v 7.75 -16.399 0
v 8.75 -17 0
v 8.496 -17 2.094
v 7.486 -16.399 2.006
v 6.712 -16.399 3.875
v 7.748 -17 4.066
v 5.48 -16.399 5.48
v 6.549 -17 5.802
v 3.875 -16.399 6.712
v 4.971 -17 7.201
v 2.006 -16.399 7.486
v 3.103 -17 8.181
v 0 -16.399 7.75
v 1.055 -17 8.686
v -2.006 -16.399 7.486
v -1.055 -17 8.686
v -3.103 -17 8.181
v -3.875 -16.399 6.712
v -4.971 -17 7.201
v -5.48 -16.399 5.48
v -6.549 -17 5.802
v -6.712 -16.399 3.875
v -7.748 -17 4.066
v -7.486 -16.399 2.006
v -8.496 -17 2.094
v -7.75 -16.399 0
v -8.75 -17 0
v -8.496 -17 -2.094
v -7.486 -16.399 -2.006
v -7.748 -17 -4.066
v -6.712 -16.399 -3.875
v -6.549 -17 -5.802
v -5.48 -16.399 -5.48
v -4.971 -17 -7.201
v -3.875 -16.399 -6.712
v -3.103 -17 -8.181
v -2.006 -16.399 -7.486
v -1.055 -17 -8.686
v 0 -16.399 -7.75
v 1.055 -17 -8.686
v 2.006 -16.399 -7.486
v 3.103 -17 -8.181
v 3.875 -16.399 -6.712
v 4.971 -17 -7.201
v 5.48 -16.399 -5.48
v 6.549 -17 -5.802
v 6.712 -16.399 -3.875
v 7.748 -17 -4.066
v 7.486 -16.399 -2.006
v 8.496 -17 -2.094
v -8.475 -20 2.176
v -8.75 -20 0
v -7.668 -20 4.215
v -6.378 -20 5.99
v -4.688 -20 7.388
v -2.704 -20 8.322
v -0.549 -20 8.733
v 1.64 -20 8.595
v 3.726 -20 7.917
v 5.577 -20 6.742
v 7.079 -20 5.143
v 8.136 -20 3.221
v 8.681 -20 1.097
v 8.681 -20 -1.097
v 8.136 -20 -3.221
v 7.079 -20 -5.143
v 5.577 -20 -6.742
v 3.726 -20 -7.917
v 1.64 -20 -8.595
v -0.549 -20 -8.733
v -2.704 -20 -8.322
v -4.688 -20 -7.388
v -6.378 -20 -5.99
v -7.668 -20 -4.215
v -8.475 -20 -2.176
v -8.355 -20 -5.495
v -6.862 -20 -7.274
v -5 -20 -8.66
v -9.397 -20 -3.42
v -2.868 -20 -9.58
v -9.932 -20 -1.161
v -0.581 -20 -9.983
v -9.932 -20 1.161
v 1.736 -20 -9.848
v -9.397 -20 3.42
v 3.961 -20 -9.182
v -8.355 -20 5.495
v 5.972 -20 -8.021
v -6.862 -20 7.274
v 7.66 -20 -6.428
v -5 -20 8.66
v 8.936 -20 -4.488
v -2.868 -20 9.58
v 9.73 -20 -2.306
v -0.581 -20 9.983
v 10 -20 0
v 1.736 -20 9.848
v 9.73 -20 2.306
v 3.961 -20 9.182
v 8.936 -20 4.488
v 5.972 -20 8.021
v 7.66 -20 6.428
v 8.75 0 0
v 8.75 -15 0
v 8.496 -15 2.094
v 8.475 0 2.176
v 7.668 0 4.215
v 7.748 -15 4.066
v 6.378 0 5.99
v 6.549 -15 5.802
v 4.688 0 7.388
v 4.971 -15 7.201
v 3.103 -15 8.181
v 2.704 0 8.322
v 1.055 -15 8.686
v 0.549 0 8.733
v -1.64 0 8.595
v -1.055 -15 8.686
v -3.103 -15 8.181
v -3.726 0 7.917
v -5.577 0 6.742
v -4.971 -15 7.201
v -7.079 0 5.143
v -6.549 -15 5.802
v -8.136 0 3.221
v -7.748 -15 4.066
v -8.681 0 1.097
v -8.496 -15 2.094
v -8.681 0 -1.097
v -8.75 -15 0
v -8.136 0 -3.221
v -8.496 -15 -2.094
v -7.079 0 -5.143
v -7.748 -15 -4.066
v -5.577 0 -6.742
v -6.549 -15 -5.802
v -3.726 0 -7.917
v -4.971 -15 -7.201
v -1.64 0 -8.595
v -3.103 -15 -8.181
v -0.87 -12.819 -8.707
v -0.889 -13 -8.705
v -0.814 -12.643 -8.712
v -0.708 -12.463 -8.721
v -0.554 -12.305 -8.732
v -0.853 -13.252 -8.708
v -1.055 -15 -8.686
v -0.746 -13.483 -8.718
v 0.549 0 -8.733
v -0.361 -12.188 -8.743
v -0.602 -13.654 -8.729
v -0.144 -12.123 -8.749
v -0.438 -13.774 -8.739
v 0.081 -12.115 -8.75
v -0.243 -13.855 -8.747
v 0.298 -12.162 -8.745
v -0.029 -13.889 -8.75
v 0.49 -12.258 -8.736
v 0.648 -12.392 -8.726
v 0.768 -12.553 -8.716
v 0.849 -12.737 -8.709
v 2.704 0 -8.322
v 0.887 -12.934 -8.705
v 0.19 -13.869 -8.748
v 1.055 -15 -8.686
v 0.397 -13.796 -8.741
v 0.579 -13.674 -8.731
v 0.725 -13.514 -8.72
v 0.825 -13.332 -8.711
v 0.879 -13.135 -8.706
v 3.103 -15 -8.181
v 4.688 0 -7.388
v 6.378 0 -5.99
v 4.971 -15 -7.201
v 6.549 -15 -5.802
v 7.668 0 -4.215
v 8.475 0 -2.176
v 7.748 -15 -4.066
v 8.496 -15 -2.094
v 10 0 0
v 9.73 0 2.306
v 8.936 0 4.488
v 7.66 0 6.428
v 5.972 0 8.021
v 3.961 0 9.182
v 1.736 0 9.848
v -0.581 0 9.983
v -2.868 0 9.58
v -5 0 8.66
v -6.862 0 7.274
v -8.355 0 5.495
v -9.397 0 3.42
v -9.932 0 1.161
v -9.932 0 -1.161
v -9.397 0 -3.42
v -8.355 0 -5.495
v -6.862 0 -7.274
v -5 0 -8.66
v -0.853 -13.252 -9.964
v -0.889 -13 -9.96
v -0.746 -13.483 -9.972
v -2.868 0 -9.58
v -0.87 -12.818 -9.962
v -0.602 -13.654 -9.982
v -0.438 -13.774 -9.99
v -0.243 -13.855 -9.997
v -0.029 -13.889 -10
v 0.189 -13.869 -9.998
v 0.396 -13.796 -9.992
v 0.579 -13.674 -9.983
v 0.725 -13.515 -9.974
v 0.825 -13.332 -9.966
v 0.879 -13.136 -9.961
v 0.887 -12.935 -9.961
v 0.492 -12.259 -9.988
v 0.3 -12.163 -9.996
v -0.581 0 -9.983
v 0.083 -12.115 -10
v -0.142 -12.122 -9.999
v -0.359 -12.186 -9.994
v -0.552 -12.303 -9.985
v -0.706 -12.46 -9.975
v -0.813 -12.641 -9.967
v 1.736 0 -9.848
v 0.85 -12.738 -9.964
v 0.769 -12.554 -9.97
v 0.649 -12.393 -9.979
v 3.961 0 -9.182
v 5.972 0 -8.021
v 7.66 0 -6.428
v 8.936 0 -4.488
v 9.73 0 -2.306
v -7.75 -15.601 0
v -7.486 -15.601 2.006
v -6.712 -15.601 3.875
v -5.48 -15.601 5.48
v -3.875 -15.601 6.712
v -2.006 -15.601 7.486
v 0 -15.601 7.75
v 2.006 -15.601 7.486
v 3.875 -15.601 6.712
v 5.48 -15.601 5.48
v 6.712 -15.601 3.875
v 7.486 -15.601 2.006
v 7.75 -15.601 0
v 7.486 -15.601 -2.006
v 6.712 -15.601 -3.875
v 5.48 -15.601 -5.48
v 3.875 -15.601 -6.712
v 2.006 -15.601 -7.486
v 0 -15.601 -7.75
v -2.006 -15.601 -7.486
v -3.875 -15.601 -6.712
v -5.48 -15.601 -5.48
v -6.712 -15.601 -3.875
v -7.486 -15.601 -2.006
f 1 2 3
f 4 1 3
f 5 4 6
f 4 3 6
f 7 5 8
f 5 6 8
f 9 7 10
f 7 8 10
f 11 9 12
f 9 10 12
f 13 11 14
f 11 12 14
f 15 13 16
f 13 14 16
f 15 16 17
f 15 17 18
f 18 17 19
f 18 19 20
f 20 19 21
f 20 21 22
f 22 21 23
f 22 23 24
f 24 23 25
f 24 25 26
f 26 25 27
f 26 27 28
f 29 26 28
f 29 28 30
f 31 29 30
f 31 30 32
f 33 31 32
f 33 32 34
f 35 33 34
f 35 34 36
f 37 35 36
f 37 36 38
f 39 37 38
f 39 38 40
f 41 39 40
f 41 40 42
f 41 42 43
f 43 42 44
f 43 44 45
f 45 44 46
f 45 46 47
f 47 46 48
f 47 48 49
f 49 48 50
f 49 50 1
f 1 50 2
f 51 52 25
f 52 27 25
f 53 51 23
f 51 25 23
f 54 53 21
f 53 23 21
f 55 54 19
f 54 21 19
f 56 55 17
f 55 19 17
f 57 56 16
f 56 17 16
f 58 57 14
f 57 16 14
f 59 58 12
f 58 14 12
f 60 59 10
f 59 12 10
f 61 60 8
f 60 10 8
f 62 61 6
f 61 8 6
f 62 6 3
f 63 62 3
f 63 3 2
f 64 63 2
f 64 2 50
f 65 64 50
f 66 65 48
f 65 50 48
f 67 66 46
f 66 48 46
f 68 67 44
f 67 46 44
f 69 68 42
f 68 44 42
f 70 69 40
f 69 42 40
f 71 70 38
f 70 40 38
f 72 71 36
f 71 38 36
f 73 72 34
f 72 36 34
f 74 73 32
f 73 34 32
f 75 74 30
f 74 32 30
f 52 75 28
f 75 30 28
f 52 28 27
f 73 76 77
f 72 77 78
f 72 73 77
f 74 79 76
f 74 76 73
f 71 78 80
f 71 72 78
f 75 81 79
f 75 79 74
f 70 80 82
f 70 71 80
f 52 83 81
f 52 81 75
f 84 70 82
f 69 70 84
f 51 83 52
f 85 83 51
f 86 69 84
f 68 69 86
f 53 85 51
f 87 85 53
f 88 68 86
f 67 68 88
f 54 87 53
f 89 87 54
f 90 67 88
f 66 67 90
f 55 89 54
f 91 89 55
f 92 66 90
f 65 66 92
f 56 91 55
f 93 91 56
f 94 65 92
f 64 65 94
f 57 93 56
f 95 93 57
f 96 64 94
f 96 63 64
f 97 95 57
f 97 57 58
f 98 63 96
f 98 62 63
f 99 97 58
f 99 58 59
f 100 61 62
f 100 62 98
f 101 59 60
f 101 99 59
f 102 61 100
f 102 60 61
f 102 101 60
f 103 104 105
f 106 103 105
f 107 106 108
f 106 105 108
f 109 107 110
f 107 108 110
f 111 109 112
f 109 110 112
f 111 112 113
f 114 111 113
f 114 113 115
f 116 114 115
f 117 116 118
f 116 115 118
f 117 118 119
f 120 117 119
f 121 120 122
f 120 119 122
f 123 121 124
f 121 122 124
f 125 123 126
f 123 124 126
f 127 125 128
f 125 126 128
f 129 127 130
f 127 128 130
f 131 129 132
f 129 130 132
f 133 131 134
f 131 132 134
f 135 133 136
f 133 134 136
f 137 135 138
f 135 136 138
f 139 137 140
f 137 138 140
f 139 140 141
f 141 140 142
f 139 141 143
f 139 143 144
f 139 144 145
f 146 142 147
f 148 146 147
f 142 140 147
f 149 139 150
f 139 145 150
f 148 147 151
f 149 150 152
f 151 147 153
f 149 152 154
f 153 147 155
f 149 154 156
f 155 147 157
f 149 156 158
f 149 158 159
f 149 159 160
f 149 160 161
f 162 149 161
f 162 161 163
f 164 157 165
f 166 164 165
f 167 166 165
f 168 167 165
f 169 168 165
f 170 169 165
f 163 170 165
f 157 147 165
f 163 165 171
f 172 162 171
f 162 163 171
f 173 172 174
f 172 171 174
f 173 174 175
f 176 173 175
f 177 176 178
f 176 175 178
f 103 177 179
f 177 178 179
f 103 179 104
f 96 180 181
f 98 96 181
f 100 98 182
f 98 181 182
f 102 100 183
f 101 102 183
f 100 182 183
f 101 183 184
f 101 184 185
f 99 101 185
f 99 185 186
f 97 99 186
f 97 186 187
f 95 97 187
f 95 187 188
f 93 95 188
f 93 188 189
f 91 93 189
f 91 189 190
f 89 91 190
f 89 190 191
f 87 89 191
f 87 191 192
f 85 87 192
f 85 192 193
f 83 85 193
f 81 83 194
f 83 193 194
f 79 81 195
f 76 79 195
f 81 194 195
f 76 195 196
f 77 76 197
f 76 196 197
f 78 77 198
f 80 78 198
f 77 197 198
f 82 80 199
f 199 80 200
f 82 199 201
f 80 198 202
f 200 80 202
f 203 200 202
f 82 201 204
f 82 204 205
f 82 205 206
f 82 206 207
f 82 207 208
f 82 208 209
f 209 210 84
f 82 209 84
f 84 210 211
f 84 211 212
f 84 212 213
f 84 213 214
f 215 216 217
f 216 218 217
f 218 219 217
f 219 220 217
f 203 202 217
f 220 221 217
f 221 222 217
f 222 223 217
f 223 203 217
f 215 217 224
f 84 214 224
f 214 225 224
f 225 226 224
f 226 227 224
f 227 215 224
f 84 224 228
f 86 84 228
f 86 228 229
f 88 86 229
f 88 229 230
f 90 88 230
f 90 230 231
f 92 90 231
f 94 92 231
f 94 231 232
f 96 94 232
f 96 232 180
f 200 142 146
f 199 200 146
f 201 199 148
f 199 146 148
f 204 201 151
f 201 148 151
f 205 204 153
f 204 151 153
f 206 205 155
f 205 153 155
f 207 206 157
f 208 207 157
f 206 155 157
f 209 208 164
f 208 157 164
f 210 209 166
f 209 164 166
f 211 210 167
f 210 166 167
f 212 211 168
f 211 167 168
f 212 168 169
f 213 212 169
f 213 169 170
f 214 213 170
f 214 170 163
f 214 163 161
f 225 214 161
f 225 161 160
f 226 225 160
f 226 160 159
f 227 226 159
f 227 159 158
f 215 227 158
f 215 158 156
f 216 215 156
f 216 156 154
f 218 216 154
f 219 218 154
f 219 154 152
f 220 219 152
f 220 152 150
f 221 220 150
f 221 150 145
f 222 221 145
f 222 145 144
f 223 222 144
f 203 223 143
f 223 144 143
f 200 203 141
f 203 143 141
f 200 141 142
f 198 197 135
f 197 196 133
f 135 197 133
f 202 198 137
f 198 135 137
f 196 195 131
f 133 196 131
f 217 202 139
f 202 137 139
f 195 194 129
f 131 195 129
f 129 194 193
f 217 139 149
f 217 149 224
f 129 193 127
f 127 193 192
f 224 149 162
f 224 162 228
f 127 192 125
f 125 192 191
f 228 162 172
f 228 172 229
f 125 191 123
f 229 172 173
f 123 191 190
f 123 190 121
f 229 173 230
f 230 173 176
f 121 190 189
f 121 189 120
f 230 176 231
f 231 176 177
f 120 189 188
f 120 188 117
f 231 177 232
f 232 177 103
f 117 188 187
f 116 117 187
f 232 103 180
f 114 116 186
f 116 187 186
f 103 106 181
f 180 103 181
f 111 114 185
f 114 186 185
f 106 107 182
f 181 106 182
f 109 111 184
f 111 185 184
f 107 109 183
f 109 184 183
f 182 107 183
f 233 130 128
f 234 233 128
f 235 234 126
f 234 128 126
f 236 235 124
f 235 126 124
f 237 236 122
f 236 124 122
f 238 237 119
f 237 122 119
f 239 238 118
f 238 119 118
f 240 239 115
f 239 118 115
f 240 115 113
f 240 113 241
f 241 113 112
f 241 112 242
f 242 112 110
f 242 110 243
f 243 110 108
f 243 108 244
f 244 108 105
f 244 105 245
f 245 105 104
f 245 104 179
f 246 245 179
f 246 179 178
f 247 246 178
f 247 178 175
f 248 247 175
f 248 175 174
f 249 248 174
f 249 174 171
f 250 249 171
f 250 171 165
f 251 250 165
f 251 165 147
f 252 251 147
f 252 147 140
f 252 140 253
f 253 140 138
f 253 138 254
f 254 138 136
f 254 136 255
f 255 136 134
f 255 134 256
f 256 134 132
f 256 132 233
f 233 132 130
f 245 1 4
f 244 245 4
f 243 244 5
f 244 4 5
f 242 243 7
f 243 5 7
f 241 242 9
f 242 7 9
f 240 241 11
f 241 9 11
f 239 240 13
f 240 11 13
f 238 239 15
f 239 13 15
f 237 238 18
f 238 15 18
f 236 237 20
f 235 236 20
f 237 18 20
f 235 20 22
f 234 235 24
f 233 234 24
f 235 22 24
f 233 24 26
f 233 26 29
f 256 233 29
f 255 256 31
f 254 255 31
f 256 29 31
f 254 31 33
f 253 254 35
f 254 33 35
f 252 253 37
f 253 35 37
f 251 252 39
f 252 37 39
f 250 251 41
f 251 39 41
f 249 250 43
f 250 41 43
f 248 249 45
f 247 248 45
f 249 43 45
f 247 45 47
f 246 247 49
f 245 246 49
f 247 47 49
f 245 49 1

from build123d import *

# Parameters (mm, degrees)
F0_R      = 10
F1_DEPTH  = 20
F3_D      = 15.5
F5_D      = 17.5
F5_DEPTH  = 3
F5_TIP    = 5.2575304165
F7_D      = 17.5
F7_DEPTH  = 15
F7_TIP    = 5.2575304165
F10_D     = 1.778
F10_DEPTH = 12.9525
F10_START = 0.0395945
F10_TIP   = 0.5341650903


with BuildPart() as f1:
    # F0 (on Front) → F1 (new body)
    with BuildSketch(Plane.XZ):
        Circle(F0_R)
    extrude(amount=F1_DEPTH)

    # F3 (through all)
    with Locations(Plane(origin=(0, 0, 0), x_dir=(-1, 0, 0), z_dir=(0, 1, 0))):
        with Locations((0, 0)):
            Hole(F3_D / 2)

    # F5
    with Locations(Plane.XZ.offset(20)):
        with Locations((0, 0)):
            Hole(F5_D / 2, depth=F5_DEPTH)
            with Locations((0, 0, -(F5_DEPTH + F5_TIP / 2))):  # 118° drill point
                Cone(0, F5_D / 2, F5_TIP, mode=Mode.SUBTRACT)

    # F7
    with Locations(Plane(origin=(0, 0, 0), x_dir=(-1, 0, 0), z_dir=(0, 1, 0))):
        with Locations((0, 0)):
            Hole(F7_D / 2, depth=F7_DEPTH)
            with Locations((0, 0, -(F7_DEPTH + F7_TIP / 2))):  # 118° drill point
                Cone(0, F7_D / 2, F7_TIP, mode=Mode.SUBTRACT)

    # F10
    # its depths count from where the whole tool has entered the part; down to there all is cleared
    with Locations(Plane(origin=(0, 0, -10), x_dir=(1, 0, 0), z_dir=(0, 0, -1)).offset(-F10_START)):
        with Locations((0, 13)):
            Hole(F10_D / 2, depth=F10_DEPTH)
            with Locations((0, 0, -(F10_DEPTH + F10_TIP / 2))):  # 118° drill point
                Cone(0, F10_D / 2, F10_TIP, mode=Mode.SUBTRACT)


solid = f1.part
